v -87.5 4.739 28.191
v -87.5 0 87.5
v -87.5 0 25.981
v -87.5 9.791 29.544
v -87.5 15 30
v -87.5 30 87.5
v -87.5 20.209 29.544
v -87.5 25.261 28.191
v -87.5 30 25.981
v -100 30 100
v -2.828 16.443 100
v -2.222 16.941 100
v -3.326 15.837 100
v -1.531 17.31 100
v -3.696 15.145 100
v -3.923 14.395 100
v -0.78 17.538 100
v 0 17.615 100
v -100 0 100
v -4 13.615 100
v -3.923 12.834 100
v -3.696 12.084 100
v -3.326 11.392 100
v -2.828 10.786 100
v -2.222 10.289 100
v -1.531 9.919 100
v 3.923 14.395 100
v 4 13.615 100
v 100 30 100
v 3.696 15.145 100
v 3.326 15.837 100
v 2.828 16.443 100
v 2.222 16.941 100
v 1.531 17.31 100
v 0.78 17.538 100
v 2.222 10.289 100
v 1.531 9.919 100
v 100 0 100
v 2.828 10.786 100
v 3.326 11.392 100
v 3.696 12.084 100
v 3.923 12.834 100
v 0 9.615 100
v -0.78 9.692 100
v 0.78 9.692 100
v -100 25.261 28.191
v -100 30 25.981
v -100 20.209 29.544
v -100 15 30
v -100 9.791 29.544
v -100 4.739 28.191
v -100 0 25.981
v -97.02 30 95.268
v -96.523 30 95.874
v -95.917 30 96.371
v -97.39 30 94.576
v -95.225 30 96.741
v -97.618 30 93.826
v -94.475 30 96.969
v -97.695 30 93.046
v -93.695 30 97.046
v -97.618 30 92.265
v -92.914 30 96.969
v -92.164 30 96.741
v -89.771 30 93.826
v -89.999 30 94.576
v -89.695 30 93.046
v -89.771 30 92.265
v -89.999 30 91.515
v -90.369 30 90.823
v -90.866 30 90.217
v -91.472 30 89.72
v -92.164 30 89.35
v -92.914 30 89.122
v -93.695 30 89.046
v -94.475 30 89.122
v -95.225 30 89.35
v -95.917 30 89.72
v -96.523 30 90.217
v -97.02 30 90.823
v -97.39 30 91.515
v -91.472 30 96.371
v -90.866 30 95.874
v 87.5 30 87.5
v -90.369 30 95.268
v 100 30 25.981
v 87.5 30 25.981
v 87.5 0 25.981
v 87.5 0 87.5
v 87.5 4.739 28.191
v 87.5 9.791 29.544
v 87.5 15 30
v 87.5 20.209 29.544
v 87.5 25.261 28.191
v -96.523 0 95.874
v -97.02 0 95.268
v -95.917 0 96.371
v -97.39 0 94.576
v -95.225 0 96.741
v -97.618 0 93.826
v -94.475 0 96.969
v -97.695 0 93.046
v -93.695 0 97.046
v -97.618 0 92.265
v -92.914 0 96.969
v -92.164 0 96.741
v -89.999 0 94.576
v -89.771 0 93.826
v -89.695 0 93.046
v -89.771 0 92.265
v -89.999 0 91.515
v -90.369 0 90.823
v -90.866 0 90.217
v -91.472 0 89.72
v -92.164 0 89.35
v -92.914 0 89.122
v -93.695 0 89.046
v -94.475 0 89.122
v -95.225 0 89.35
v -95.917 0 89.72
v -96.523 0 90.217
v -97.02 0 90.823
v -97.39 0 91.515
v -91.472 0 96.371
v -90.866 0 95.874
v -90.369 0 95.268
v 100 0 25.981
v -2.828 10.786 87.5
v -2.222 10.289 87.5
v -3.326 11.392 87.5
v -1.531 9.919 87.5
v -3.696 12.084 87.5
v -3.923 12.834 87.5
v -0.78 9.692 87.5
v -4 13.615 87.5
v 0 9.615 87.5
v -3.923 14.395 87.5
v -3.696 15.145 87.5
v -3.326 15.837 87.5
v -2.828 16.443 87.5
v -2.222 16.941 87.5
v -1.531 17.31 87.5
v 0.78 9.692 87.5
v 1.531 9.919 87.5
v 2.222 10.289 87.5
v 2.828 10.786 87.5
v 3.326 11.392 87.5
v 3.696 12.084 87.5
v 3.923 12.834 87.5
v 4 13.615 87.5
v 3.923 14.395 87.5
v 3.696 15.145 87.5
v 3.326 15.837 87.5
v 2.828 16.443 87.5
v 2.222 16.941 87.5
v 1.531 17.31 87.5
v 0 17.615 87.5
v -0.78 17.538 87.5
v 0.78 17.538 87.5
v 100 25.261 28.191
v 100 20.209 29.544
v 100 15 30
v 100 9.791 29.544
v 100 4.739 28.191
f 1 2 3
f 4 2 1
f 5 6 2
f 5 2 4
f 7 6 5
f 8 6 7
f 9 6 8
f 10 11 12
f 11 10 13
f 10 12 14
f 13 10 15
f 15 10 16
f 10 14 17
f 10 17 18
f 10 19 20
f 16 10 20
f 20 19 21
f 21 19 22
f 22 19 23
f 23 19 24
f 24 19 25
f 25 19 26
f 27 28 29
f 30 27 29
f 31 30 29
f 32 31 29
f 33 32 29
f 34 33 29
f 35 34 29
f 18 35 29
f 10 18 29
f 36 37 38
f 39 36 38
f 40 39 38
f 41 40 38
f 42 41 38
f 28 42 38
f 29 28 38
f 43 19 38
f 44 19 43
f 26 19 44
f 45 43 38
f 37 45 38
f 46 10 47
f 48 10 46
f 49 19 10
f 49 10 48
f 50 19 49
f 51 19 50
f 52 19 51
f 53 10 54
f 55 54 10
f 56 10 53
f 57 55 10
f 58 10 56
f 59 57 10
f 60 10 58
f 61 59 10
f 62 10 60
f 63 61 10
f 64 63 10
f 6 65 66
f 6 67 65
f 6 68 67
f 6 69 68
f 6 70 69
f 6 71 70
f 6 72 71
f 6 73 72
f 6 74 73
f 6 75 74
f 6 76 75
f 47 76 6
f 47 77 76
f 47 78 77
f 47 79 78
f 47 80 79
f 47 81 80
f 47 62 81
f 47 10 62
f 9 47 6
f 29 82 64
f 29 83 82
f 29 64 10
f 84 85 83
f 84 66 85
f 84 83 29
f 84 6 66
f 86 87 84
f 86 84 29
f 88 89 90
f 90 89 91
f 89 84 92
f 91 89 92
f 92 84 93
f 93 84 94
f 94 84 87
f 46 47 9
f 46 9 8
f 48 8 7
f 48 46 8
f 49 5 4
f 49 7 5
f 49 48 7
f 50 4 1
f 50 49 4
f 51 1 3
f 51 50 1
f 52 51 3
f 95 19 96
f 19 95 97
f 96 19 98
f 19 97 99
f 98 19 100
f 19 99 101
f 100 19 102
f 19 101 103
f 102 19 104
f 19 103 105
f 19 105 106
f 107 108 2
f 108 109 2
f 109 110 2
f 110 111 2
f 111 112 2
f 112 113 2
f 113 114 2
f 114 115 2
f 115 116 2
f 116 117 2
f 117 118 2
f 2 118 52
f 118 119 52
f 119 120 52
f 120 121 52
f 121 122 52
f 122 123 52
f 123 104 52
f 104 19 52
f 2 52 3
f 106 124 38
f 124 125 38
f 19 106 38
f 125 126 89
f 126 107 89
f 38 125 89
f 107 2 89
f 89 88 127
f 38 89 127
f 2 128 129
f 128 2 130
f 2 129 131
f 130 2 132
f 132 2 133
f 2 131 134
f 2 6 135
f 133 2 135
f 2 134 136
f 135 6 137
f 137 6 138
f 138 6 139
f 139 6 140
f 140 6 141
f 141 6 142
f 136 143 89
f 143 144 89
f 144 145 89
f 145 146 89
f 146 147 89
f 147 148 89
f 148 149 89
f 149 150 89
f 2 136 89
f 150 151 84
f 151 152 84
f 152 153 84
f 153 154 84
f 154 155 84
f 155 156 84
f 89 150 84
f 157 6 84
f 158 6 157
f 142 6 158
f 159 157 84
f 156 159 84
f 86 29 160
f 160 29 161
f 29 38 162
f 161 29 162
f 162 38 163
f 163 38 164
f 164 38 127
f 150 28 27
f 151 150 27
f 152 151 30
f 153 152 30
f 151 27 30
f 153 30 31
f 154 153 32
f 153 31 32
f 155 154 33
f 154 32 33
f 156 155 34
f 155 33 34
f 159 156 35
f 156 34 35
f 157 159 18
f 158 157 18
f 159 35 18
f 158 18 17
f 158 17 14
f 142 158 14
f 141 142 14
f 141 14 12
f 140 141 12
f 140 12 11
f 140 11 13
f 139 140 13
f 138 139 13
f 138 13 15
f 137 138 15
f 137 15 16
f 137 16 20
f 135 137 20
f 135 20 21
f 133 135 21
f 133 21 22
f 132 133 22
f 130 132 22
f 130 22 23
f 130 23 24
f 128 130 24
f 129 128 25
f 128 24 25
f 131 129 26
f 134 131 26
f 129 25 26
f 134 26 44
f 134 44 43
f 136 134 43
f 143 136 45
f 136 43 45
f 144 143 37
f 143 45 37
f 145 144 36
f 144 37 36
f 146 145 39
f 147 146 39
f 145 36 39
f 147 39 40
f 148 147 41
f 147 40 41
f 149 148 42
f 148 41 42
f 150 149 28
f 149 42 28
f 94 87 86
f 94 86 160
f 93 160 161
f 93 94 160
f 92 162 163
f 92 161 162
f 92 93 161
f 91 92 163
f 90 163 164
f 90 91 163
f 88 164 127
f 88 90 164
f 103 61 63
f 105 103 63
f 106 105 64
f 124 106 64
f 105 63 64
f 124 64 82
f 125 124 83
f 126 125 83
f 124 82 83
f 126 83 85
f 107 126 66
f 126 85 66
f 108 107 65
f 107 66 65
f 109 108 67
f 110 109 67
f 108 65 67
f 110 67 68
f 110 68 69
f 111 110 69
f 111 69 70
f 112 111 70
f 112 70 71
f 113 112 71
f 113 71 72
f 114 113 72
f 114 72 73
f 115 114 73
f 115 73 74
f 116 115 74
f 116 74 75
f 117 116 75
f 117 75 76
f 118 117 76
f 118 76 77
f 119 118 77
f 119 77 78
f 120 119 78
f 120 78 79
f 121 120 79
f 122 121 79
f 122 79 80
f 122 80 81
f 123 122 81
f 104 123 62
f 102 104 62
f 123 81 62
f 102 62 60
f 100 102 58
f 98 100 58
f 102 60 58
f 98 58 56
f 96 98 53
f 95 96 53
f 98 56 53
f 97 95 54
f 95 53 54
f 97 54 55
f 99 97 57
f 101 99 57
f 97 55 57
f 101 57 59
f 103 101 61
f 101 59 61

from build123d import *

# Parameters (mm, degrees)
SKETCH1_W                = 200
SKETCH1_H                = 200
BOSS_EXTRUDE1_DEPTH      = 30
SKETCH4_W                = 175
SKETCH4_H                = 175
CUT_EXTRUDE1_DEPTH       = 30
SKETCH7_R                = 4
CUT_EXTRUDE2_DEPTH       = 210
SKETCH10_W               = 6.040230253
SKETCH10_H               = 30
BOSS_EXTRUDE2_DEPTH      = 20
SKETCH11_W               = 10
SKETCH11_H               = 30
BOSS_EXTRUDE3_DEPTH      = 20
CUT_EXTRUDE3_START       = -231
SKETCH12_R               = 4
CUT_EXTRUDE3_DEPTH       = 231
SKETCH13_R               = 4
CUT_EXTRUDE5_DEPTH       = 231
SKETCH14_R               = 4
CUT_EXTRUDE6_DEPTH       = 250.5
SKETCH15_R               = 30
SKETCH15_R_2             = 22
BOSS_EXTRUDE5_DEPTH      = 201
SKETCH17_R               = 22
CUT_EXTRUDE7_DEPTH       = 201
SKETCH21_W               = 9.5
SKETCH21_H               = 28.855904386
BOSS_EXTRUDE6_DEPTH      = 26
SKETCH22_W               = 9.5
SKETCH22_H               = 6.040230253
CUT_EXTRUDE10_DEPTH      = 49
SKETCH23_W               = 10.008922512
SKETCH23_H               = 28.855904386
BOSS_EXTRUDE7_DEPTH      = 21
SKETCH24_W               = 9.5
SKETCH24_H               = 1.144095614
CUT_EXTRUDE11_DEPTH      = 27
SKETCH26_W               = 0.50137975
SKETCH26_H               = 20.893624798
CUT_EXTRUDE12_DEPTH      = 35
SKETCH27_R               = 49.192783102
CUT_EXTRUDE13_DEPTH      = 175
SKETCH28_R               = 41.209023923
CUT_EXTRUDE14_DEPTH      = 175
SKETCH31_R               = 25.671187695
CUT_EXTRUDE15_DEPTH      = 175
CUT_EXTRUDE16_DEPTH      = 246.814971066
CUT_EXTRUDE16_DEPTH_BACK = 220


with BuildPart() as part:
    # Sketch1 → Boss-Extrude1 (new body)
    with BuildSketch(Plane(origin=(0, 0, 0), x_dir=(1, 0, 0), z_dir=(0, 1, 0))):
        Rectangle(SKETCH1_W, SKETCH1_H)
    extrude(amount=BOSS_EXTRUDE1_DEPTH)

    # Sketch4 → Cut-Extrude1 (cut)
    with BuildSketch(Plane(origin=(0, 30, 0), x_dir=(1, 0, 0), z_dir=(0, 1, 0))):
        Rectangle(SKETCH4_W, SKETCH4_H)
    extrude(amount=-CUT_EXTRUDE1_DEPTH, mode=Mode.SUBTRACT)

    # Sketch7 → Cut-Extrude2 (cut)
    with BuildSketch(Plane.ZY.offset(100)):
        with Locations((0, 15)):
            Circle(SKETCH7_R)
    extrude(amount=-CUT_EXTRUDE2_DEPTH, mode=Mode.SUBTRACT)

    # Sketch10 → Boss-Extrude2 (add)
    with BuildSketch(Plane.ZY.offset(100)):
        with Locations((-11.64671233, 15)):
            Rectangle(SKETCH10_W, SKETCH10_H)
    extrude(amount=BOSS_EXTRUDE2_DEPTH)

    # Sketch11 → Boss-Extrude3 (add)
    with BuildSketch(Plane.XY.offset(-8.626597203)):
        with Locations((-115, 15)):
            Rectangle(SKETCH11_W, SKETCH11_H)
    extrude(amount=BOSS_EXTRUDE3_DEPTH)

    # Sketch12 → Cut-Extrude3 (cut)
    with BuildSketch(Plane(origin=(100, 0, 0), x_dir=(0, 0, -1), z_dir=(1, 0, 0)).offset(CUT_EXTRUDE3_START)):
        with Locations(Location((0, 15, 0), (0, 0, 180))):
            Circle(SKETCH12_R)
    extrude(amount=CUT_EXTRUDE3_DEPTH, mode=Mode.SUBTRACT)

    # Sketch13 → Cut-Extrude5 (cut)
    with BuildSketch(Plane(origin=(0, 30, 0), x_dir=(1, 0, 0), z_dir=(0, 1, 0))):
        with Locations(Location((-93.69452155, -93.045501349, 0), (0, 0, 270))):
            Circle(SKETCH13_R)
    extrude(amount=-CUT_EXTRUDE5_DEPTH, mode=Mode.SUBTRACT)

    # Sketch14 → Cut-Extrude6 (cut)
    with BuildSketch(Plane.XY.offset(100)):
        with Locations((0, 13.614739596)):
            Circle(SKETCH14_R)
    extrude(amount=-CUT_EXTRUDE6_DEPTH, mode=Mode.SUBTRACT)

    # Sketch15 → Boss-Extrude5 (add)
    with BuildSketch(Plane(origin=(100, 0, 0), x_dir=(0, 0, -1), z_dir=(1, 0, 0))):
        with Locations((0, 15)):
            Circle(SKETCH15_R)
        with Locations((0, 15)):
            Circle(SKETCH15_R_2, mode=Mode.SUBTRACT)
    extrude(amount=-BOSS_EXTRUDE5_DEPTH)

    # Sketch17 → Cut-Extrude7 (cut)
    with BuildSketch(Plane(origin=(100, 0, 0), x_dir=(0, 0, -1), z_dir=(1, 0, 0))):
        with Locations((0.074377339, 15.100772812)):
            Circle(SKETCH17_R)
    extrude(amount=-CUT_EXTRUDE7_DEPTH, mode=Mode.SUBTRACT)


with BuildPart() as cut_extrude7_piece_1:
    # of the separate pieces the step leaves, piece 1, a body of its own (cut_extrude7_pieces)
    add(part.part.solids().sort_by_distance((-100, 0, -100))[0])



with BuildPart() as cut_extrude7_piece_2:
    # of the separate pieces the step leaves, piece 2, a body of its own (cut_extrude7_pieces)
    add(part.part.solids().sort_by_distance((-101, 0, -14.666827456))[0])

    # Sketch21 → Boss-Extrude6 (add)
    with BuildSketch(Plane(origin=(0, 0, -14.666827456), x_dir=(-1, 0, 0), z_dir=(0, 0, -1))):
        with Locations((115.25, 15.572047807)):
            Rectangle(SKETCH21_W, SKETCH21_H)
    extrude(amount=BOSS_EXTRUDE6_DEPTH)

    # Sketch22 → Cut-Extrude10 (cut)
    with BuildSketch(Plane(origin=(0, 30, 0), x_dir=(1, 0, 0), z_dir=(0, 1, 0))):
        with Locations((-105.75, 11.64671233)):
            Rectangle(SKETCH22_W, SKETCH22_H)
    extrude(amount=-CUT_EXTRUDE10_DEPTH, mode=Mode.SUBTRACT)


with BuildPart() as cut_extrude7_piece_1_1:
    add(cut_extrude7_piece_1.part)

    add(cut_extrude7_piece_2.part)  # Boss-Extrude7 merges Cut-Extrude7 piece 2
    # Sketch23 → Boss-Extrude7 (add)
    with BuildSketch(Plane(origin=(-110.5, 0, 0), x_dir=(0, 0, -1), z_dir=(1, 0, 0))):
        with Locations((35.6623662, 15.572047807)):
            Rectangle(SKETCH23_W, SKETCH23_H)
    extrude(amount=BOSS_EXTRUDE7_DEPTH)

    # Sketch24 → Cut-Extrude11 (cut)
    with BuildSketch(Plane(origin=(0, 0, -14.666827456), x_dir=(-1, 0, 0), z_dir=(0, 0, -1))):
        with Locations((115.25, 0.572047807)):
            Rectangle(SKETCH24_W, SKETCH24_H)
    extrude(amount=-CUT_EXTRUDE11_DEPTH, mode=Mode.SUBTRACT)

    # Sketch26 → Cut-Extrude12 (cut)
    with BuildSketch(Plane.XZ):
        with Locations((-110.249310125, 1.820215196)):
            Rectangle(SKETCH26_W, SKETCH26_H)
    extrude(amount=-CUT_EXTRUDE12_DEPTH, mode=Mode.SUBTRACT)

    # Sketch27 → Cut-Extrude13 (cut)
    with BuildSketch(Plane(origin=(-87.5, 0, 0), x_dir=(0, 0, -1), z_dir=(1, 0, 0))):
        with Locations((-31.916352411, 15.376133278)):
            Circle(SKETCH27_R)
    extrude(amount=CUT_EXTRUDE13_DEPTH, mode=Mode.SUBTRACT)

    # Sketch28 → Cut-Extrude14 (cut)
    with BuildSketch(Plane(origin=(-87.5, 0, 0), x_dir=(0, 0, -1), z_dir=(1, 0, 0))):
        with Locations((37.762434774, 15.494435184)):
            Circle(SKETCH28_R)
    extrude(amount=CUT_EXTRUDE14_DEPTH, mode=Mode.SUBTRACT)

    # Sketch31 → Cut-Extrude15 (cut)
    with BuildSketch(Plane(origin=(-87.5, 0, 0), x_dir=(0, 0, -1), z_dir=(1, 0, 0))):
        with Locations((-2.206126603, -10.850671417)):
            Circle(SKETCH31_R)
    extrude(amount=CUT_EXTRUDE15_DEPTH, mode=Mode.SUBTRACT)

    # Sketch32 → Cut-Extrude16 (cut, two sides: drawn at the far end of the back side and taken through both)
    with BuildSketch(Plane(origin=(100, 0, 0), x_dir=(0, 0, -1), z_dir=(1, 0, 0)).offset(-CUT_EXTRUDE16_DEPTH_BACK)):
        with BuildLine():
            Line((112.795739645, 270.367951942), (-25.980762114, 30))
            ThreePointArc((-25.980762114, 30), (-30, 15), (-25.980762114, 0))
            Line((-25.980762114, 0), (112.795739645, -240.367951942))
            Line((112.795739645, -240.367951942), (667.901746678, -240.367951942))
            Line((667.901746678, -240.367951942), (667.901746678, 270.367951942))
            Line((667.901746678, 270.367951942), (112.795739645, 270.367951942))
        make_face()
    extrude(amount=CUT_EXTRUDE16_DEPTH + CUT_EXTRUDE16_DEPTH_BACK, mode=Mode.SUBTRACT)


solid = cut_extrude7_piece_1_1.part
